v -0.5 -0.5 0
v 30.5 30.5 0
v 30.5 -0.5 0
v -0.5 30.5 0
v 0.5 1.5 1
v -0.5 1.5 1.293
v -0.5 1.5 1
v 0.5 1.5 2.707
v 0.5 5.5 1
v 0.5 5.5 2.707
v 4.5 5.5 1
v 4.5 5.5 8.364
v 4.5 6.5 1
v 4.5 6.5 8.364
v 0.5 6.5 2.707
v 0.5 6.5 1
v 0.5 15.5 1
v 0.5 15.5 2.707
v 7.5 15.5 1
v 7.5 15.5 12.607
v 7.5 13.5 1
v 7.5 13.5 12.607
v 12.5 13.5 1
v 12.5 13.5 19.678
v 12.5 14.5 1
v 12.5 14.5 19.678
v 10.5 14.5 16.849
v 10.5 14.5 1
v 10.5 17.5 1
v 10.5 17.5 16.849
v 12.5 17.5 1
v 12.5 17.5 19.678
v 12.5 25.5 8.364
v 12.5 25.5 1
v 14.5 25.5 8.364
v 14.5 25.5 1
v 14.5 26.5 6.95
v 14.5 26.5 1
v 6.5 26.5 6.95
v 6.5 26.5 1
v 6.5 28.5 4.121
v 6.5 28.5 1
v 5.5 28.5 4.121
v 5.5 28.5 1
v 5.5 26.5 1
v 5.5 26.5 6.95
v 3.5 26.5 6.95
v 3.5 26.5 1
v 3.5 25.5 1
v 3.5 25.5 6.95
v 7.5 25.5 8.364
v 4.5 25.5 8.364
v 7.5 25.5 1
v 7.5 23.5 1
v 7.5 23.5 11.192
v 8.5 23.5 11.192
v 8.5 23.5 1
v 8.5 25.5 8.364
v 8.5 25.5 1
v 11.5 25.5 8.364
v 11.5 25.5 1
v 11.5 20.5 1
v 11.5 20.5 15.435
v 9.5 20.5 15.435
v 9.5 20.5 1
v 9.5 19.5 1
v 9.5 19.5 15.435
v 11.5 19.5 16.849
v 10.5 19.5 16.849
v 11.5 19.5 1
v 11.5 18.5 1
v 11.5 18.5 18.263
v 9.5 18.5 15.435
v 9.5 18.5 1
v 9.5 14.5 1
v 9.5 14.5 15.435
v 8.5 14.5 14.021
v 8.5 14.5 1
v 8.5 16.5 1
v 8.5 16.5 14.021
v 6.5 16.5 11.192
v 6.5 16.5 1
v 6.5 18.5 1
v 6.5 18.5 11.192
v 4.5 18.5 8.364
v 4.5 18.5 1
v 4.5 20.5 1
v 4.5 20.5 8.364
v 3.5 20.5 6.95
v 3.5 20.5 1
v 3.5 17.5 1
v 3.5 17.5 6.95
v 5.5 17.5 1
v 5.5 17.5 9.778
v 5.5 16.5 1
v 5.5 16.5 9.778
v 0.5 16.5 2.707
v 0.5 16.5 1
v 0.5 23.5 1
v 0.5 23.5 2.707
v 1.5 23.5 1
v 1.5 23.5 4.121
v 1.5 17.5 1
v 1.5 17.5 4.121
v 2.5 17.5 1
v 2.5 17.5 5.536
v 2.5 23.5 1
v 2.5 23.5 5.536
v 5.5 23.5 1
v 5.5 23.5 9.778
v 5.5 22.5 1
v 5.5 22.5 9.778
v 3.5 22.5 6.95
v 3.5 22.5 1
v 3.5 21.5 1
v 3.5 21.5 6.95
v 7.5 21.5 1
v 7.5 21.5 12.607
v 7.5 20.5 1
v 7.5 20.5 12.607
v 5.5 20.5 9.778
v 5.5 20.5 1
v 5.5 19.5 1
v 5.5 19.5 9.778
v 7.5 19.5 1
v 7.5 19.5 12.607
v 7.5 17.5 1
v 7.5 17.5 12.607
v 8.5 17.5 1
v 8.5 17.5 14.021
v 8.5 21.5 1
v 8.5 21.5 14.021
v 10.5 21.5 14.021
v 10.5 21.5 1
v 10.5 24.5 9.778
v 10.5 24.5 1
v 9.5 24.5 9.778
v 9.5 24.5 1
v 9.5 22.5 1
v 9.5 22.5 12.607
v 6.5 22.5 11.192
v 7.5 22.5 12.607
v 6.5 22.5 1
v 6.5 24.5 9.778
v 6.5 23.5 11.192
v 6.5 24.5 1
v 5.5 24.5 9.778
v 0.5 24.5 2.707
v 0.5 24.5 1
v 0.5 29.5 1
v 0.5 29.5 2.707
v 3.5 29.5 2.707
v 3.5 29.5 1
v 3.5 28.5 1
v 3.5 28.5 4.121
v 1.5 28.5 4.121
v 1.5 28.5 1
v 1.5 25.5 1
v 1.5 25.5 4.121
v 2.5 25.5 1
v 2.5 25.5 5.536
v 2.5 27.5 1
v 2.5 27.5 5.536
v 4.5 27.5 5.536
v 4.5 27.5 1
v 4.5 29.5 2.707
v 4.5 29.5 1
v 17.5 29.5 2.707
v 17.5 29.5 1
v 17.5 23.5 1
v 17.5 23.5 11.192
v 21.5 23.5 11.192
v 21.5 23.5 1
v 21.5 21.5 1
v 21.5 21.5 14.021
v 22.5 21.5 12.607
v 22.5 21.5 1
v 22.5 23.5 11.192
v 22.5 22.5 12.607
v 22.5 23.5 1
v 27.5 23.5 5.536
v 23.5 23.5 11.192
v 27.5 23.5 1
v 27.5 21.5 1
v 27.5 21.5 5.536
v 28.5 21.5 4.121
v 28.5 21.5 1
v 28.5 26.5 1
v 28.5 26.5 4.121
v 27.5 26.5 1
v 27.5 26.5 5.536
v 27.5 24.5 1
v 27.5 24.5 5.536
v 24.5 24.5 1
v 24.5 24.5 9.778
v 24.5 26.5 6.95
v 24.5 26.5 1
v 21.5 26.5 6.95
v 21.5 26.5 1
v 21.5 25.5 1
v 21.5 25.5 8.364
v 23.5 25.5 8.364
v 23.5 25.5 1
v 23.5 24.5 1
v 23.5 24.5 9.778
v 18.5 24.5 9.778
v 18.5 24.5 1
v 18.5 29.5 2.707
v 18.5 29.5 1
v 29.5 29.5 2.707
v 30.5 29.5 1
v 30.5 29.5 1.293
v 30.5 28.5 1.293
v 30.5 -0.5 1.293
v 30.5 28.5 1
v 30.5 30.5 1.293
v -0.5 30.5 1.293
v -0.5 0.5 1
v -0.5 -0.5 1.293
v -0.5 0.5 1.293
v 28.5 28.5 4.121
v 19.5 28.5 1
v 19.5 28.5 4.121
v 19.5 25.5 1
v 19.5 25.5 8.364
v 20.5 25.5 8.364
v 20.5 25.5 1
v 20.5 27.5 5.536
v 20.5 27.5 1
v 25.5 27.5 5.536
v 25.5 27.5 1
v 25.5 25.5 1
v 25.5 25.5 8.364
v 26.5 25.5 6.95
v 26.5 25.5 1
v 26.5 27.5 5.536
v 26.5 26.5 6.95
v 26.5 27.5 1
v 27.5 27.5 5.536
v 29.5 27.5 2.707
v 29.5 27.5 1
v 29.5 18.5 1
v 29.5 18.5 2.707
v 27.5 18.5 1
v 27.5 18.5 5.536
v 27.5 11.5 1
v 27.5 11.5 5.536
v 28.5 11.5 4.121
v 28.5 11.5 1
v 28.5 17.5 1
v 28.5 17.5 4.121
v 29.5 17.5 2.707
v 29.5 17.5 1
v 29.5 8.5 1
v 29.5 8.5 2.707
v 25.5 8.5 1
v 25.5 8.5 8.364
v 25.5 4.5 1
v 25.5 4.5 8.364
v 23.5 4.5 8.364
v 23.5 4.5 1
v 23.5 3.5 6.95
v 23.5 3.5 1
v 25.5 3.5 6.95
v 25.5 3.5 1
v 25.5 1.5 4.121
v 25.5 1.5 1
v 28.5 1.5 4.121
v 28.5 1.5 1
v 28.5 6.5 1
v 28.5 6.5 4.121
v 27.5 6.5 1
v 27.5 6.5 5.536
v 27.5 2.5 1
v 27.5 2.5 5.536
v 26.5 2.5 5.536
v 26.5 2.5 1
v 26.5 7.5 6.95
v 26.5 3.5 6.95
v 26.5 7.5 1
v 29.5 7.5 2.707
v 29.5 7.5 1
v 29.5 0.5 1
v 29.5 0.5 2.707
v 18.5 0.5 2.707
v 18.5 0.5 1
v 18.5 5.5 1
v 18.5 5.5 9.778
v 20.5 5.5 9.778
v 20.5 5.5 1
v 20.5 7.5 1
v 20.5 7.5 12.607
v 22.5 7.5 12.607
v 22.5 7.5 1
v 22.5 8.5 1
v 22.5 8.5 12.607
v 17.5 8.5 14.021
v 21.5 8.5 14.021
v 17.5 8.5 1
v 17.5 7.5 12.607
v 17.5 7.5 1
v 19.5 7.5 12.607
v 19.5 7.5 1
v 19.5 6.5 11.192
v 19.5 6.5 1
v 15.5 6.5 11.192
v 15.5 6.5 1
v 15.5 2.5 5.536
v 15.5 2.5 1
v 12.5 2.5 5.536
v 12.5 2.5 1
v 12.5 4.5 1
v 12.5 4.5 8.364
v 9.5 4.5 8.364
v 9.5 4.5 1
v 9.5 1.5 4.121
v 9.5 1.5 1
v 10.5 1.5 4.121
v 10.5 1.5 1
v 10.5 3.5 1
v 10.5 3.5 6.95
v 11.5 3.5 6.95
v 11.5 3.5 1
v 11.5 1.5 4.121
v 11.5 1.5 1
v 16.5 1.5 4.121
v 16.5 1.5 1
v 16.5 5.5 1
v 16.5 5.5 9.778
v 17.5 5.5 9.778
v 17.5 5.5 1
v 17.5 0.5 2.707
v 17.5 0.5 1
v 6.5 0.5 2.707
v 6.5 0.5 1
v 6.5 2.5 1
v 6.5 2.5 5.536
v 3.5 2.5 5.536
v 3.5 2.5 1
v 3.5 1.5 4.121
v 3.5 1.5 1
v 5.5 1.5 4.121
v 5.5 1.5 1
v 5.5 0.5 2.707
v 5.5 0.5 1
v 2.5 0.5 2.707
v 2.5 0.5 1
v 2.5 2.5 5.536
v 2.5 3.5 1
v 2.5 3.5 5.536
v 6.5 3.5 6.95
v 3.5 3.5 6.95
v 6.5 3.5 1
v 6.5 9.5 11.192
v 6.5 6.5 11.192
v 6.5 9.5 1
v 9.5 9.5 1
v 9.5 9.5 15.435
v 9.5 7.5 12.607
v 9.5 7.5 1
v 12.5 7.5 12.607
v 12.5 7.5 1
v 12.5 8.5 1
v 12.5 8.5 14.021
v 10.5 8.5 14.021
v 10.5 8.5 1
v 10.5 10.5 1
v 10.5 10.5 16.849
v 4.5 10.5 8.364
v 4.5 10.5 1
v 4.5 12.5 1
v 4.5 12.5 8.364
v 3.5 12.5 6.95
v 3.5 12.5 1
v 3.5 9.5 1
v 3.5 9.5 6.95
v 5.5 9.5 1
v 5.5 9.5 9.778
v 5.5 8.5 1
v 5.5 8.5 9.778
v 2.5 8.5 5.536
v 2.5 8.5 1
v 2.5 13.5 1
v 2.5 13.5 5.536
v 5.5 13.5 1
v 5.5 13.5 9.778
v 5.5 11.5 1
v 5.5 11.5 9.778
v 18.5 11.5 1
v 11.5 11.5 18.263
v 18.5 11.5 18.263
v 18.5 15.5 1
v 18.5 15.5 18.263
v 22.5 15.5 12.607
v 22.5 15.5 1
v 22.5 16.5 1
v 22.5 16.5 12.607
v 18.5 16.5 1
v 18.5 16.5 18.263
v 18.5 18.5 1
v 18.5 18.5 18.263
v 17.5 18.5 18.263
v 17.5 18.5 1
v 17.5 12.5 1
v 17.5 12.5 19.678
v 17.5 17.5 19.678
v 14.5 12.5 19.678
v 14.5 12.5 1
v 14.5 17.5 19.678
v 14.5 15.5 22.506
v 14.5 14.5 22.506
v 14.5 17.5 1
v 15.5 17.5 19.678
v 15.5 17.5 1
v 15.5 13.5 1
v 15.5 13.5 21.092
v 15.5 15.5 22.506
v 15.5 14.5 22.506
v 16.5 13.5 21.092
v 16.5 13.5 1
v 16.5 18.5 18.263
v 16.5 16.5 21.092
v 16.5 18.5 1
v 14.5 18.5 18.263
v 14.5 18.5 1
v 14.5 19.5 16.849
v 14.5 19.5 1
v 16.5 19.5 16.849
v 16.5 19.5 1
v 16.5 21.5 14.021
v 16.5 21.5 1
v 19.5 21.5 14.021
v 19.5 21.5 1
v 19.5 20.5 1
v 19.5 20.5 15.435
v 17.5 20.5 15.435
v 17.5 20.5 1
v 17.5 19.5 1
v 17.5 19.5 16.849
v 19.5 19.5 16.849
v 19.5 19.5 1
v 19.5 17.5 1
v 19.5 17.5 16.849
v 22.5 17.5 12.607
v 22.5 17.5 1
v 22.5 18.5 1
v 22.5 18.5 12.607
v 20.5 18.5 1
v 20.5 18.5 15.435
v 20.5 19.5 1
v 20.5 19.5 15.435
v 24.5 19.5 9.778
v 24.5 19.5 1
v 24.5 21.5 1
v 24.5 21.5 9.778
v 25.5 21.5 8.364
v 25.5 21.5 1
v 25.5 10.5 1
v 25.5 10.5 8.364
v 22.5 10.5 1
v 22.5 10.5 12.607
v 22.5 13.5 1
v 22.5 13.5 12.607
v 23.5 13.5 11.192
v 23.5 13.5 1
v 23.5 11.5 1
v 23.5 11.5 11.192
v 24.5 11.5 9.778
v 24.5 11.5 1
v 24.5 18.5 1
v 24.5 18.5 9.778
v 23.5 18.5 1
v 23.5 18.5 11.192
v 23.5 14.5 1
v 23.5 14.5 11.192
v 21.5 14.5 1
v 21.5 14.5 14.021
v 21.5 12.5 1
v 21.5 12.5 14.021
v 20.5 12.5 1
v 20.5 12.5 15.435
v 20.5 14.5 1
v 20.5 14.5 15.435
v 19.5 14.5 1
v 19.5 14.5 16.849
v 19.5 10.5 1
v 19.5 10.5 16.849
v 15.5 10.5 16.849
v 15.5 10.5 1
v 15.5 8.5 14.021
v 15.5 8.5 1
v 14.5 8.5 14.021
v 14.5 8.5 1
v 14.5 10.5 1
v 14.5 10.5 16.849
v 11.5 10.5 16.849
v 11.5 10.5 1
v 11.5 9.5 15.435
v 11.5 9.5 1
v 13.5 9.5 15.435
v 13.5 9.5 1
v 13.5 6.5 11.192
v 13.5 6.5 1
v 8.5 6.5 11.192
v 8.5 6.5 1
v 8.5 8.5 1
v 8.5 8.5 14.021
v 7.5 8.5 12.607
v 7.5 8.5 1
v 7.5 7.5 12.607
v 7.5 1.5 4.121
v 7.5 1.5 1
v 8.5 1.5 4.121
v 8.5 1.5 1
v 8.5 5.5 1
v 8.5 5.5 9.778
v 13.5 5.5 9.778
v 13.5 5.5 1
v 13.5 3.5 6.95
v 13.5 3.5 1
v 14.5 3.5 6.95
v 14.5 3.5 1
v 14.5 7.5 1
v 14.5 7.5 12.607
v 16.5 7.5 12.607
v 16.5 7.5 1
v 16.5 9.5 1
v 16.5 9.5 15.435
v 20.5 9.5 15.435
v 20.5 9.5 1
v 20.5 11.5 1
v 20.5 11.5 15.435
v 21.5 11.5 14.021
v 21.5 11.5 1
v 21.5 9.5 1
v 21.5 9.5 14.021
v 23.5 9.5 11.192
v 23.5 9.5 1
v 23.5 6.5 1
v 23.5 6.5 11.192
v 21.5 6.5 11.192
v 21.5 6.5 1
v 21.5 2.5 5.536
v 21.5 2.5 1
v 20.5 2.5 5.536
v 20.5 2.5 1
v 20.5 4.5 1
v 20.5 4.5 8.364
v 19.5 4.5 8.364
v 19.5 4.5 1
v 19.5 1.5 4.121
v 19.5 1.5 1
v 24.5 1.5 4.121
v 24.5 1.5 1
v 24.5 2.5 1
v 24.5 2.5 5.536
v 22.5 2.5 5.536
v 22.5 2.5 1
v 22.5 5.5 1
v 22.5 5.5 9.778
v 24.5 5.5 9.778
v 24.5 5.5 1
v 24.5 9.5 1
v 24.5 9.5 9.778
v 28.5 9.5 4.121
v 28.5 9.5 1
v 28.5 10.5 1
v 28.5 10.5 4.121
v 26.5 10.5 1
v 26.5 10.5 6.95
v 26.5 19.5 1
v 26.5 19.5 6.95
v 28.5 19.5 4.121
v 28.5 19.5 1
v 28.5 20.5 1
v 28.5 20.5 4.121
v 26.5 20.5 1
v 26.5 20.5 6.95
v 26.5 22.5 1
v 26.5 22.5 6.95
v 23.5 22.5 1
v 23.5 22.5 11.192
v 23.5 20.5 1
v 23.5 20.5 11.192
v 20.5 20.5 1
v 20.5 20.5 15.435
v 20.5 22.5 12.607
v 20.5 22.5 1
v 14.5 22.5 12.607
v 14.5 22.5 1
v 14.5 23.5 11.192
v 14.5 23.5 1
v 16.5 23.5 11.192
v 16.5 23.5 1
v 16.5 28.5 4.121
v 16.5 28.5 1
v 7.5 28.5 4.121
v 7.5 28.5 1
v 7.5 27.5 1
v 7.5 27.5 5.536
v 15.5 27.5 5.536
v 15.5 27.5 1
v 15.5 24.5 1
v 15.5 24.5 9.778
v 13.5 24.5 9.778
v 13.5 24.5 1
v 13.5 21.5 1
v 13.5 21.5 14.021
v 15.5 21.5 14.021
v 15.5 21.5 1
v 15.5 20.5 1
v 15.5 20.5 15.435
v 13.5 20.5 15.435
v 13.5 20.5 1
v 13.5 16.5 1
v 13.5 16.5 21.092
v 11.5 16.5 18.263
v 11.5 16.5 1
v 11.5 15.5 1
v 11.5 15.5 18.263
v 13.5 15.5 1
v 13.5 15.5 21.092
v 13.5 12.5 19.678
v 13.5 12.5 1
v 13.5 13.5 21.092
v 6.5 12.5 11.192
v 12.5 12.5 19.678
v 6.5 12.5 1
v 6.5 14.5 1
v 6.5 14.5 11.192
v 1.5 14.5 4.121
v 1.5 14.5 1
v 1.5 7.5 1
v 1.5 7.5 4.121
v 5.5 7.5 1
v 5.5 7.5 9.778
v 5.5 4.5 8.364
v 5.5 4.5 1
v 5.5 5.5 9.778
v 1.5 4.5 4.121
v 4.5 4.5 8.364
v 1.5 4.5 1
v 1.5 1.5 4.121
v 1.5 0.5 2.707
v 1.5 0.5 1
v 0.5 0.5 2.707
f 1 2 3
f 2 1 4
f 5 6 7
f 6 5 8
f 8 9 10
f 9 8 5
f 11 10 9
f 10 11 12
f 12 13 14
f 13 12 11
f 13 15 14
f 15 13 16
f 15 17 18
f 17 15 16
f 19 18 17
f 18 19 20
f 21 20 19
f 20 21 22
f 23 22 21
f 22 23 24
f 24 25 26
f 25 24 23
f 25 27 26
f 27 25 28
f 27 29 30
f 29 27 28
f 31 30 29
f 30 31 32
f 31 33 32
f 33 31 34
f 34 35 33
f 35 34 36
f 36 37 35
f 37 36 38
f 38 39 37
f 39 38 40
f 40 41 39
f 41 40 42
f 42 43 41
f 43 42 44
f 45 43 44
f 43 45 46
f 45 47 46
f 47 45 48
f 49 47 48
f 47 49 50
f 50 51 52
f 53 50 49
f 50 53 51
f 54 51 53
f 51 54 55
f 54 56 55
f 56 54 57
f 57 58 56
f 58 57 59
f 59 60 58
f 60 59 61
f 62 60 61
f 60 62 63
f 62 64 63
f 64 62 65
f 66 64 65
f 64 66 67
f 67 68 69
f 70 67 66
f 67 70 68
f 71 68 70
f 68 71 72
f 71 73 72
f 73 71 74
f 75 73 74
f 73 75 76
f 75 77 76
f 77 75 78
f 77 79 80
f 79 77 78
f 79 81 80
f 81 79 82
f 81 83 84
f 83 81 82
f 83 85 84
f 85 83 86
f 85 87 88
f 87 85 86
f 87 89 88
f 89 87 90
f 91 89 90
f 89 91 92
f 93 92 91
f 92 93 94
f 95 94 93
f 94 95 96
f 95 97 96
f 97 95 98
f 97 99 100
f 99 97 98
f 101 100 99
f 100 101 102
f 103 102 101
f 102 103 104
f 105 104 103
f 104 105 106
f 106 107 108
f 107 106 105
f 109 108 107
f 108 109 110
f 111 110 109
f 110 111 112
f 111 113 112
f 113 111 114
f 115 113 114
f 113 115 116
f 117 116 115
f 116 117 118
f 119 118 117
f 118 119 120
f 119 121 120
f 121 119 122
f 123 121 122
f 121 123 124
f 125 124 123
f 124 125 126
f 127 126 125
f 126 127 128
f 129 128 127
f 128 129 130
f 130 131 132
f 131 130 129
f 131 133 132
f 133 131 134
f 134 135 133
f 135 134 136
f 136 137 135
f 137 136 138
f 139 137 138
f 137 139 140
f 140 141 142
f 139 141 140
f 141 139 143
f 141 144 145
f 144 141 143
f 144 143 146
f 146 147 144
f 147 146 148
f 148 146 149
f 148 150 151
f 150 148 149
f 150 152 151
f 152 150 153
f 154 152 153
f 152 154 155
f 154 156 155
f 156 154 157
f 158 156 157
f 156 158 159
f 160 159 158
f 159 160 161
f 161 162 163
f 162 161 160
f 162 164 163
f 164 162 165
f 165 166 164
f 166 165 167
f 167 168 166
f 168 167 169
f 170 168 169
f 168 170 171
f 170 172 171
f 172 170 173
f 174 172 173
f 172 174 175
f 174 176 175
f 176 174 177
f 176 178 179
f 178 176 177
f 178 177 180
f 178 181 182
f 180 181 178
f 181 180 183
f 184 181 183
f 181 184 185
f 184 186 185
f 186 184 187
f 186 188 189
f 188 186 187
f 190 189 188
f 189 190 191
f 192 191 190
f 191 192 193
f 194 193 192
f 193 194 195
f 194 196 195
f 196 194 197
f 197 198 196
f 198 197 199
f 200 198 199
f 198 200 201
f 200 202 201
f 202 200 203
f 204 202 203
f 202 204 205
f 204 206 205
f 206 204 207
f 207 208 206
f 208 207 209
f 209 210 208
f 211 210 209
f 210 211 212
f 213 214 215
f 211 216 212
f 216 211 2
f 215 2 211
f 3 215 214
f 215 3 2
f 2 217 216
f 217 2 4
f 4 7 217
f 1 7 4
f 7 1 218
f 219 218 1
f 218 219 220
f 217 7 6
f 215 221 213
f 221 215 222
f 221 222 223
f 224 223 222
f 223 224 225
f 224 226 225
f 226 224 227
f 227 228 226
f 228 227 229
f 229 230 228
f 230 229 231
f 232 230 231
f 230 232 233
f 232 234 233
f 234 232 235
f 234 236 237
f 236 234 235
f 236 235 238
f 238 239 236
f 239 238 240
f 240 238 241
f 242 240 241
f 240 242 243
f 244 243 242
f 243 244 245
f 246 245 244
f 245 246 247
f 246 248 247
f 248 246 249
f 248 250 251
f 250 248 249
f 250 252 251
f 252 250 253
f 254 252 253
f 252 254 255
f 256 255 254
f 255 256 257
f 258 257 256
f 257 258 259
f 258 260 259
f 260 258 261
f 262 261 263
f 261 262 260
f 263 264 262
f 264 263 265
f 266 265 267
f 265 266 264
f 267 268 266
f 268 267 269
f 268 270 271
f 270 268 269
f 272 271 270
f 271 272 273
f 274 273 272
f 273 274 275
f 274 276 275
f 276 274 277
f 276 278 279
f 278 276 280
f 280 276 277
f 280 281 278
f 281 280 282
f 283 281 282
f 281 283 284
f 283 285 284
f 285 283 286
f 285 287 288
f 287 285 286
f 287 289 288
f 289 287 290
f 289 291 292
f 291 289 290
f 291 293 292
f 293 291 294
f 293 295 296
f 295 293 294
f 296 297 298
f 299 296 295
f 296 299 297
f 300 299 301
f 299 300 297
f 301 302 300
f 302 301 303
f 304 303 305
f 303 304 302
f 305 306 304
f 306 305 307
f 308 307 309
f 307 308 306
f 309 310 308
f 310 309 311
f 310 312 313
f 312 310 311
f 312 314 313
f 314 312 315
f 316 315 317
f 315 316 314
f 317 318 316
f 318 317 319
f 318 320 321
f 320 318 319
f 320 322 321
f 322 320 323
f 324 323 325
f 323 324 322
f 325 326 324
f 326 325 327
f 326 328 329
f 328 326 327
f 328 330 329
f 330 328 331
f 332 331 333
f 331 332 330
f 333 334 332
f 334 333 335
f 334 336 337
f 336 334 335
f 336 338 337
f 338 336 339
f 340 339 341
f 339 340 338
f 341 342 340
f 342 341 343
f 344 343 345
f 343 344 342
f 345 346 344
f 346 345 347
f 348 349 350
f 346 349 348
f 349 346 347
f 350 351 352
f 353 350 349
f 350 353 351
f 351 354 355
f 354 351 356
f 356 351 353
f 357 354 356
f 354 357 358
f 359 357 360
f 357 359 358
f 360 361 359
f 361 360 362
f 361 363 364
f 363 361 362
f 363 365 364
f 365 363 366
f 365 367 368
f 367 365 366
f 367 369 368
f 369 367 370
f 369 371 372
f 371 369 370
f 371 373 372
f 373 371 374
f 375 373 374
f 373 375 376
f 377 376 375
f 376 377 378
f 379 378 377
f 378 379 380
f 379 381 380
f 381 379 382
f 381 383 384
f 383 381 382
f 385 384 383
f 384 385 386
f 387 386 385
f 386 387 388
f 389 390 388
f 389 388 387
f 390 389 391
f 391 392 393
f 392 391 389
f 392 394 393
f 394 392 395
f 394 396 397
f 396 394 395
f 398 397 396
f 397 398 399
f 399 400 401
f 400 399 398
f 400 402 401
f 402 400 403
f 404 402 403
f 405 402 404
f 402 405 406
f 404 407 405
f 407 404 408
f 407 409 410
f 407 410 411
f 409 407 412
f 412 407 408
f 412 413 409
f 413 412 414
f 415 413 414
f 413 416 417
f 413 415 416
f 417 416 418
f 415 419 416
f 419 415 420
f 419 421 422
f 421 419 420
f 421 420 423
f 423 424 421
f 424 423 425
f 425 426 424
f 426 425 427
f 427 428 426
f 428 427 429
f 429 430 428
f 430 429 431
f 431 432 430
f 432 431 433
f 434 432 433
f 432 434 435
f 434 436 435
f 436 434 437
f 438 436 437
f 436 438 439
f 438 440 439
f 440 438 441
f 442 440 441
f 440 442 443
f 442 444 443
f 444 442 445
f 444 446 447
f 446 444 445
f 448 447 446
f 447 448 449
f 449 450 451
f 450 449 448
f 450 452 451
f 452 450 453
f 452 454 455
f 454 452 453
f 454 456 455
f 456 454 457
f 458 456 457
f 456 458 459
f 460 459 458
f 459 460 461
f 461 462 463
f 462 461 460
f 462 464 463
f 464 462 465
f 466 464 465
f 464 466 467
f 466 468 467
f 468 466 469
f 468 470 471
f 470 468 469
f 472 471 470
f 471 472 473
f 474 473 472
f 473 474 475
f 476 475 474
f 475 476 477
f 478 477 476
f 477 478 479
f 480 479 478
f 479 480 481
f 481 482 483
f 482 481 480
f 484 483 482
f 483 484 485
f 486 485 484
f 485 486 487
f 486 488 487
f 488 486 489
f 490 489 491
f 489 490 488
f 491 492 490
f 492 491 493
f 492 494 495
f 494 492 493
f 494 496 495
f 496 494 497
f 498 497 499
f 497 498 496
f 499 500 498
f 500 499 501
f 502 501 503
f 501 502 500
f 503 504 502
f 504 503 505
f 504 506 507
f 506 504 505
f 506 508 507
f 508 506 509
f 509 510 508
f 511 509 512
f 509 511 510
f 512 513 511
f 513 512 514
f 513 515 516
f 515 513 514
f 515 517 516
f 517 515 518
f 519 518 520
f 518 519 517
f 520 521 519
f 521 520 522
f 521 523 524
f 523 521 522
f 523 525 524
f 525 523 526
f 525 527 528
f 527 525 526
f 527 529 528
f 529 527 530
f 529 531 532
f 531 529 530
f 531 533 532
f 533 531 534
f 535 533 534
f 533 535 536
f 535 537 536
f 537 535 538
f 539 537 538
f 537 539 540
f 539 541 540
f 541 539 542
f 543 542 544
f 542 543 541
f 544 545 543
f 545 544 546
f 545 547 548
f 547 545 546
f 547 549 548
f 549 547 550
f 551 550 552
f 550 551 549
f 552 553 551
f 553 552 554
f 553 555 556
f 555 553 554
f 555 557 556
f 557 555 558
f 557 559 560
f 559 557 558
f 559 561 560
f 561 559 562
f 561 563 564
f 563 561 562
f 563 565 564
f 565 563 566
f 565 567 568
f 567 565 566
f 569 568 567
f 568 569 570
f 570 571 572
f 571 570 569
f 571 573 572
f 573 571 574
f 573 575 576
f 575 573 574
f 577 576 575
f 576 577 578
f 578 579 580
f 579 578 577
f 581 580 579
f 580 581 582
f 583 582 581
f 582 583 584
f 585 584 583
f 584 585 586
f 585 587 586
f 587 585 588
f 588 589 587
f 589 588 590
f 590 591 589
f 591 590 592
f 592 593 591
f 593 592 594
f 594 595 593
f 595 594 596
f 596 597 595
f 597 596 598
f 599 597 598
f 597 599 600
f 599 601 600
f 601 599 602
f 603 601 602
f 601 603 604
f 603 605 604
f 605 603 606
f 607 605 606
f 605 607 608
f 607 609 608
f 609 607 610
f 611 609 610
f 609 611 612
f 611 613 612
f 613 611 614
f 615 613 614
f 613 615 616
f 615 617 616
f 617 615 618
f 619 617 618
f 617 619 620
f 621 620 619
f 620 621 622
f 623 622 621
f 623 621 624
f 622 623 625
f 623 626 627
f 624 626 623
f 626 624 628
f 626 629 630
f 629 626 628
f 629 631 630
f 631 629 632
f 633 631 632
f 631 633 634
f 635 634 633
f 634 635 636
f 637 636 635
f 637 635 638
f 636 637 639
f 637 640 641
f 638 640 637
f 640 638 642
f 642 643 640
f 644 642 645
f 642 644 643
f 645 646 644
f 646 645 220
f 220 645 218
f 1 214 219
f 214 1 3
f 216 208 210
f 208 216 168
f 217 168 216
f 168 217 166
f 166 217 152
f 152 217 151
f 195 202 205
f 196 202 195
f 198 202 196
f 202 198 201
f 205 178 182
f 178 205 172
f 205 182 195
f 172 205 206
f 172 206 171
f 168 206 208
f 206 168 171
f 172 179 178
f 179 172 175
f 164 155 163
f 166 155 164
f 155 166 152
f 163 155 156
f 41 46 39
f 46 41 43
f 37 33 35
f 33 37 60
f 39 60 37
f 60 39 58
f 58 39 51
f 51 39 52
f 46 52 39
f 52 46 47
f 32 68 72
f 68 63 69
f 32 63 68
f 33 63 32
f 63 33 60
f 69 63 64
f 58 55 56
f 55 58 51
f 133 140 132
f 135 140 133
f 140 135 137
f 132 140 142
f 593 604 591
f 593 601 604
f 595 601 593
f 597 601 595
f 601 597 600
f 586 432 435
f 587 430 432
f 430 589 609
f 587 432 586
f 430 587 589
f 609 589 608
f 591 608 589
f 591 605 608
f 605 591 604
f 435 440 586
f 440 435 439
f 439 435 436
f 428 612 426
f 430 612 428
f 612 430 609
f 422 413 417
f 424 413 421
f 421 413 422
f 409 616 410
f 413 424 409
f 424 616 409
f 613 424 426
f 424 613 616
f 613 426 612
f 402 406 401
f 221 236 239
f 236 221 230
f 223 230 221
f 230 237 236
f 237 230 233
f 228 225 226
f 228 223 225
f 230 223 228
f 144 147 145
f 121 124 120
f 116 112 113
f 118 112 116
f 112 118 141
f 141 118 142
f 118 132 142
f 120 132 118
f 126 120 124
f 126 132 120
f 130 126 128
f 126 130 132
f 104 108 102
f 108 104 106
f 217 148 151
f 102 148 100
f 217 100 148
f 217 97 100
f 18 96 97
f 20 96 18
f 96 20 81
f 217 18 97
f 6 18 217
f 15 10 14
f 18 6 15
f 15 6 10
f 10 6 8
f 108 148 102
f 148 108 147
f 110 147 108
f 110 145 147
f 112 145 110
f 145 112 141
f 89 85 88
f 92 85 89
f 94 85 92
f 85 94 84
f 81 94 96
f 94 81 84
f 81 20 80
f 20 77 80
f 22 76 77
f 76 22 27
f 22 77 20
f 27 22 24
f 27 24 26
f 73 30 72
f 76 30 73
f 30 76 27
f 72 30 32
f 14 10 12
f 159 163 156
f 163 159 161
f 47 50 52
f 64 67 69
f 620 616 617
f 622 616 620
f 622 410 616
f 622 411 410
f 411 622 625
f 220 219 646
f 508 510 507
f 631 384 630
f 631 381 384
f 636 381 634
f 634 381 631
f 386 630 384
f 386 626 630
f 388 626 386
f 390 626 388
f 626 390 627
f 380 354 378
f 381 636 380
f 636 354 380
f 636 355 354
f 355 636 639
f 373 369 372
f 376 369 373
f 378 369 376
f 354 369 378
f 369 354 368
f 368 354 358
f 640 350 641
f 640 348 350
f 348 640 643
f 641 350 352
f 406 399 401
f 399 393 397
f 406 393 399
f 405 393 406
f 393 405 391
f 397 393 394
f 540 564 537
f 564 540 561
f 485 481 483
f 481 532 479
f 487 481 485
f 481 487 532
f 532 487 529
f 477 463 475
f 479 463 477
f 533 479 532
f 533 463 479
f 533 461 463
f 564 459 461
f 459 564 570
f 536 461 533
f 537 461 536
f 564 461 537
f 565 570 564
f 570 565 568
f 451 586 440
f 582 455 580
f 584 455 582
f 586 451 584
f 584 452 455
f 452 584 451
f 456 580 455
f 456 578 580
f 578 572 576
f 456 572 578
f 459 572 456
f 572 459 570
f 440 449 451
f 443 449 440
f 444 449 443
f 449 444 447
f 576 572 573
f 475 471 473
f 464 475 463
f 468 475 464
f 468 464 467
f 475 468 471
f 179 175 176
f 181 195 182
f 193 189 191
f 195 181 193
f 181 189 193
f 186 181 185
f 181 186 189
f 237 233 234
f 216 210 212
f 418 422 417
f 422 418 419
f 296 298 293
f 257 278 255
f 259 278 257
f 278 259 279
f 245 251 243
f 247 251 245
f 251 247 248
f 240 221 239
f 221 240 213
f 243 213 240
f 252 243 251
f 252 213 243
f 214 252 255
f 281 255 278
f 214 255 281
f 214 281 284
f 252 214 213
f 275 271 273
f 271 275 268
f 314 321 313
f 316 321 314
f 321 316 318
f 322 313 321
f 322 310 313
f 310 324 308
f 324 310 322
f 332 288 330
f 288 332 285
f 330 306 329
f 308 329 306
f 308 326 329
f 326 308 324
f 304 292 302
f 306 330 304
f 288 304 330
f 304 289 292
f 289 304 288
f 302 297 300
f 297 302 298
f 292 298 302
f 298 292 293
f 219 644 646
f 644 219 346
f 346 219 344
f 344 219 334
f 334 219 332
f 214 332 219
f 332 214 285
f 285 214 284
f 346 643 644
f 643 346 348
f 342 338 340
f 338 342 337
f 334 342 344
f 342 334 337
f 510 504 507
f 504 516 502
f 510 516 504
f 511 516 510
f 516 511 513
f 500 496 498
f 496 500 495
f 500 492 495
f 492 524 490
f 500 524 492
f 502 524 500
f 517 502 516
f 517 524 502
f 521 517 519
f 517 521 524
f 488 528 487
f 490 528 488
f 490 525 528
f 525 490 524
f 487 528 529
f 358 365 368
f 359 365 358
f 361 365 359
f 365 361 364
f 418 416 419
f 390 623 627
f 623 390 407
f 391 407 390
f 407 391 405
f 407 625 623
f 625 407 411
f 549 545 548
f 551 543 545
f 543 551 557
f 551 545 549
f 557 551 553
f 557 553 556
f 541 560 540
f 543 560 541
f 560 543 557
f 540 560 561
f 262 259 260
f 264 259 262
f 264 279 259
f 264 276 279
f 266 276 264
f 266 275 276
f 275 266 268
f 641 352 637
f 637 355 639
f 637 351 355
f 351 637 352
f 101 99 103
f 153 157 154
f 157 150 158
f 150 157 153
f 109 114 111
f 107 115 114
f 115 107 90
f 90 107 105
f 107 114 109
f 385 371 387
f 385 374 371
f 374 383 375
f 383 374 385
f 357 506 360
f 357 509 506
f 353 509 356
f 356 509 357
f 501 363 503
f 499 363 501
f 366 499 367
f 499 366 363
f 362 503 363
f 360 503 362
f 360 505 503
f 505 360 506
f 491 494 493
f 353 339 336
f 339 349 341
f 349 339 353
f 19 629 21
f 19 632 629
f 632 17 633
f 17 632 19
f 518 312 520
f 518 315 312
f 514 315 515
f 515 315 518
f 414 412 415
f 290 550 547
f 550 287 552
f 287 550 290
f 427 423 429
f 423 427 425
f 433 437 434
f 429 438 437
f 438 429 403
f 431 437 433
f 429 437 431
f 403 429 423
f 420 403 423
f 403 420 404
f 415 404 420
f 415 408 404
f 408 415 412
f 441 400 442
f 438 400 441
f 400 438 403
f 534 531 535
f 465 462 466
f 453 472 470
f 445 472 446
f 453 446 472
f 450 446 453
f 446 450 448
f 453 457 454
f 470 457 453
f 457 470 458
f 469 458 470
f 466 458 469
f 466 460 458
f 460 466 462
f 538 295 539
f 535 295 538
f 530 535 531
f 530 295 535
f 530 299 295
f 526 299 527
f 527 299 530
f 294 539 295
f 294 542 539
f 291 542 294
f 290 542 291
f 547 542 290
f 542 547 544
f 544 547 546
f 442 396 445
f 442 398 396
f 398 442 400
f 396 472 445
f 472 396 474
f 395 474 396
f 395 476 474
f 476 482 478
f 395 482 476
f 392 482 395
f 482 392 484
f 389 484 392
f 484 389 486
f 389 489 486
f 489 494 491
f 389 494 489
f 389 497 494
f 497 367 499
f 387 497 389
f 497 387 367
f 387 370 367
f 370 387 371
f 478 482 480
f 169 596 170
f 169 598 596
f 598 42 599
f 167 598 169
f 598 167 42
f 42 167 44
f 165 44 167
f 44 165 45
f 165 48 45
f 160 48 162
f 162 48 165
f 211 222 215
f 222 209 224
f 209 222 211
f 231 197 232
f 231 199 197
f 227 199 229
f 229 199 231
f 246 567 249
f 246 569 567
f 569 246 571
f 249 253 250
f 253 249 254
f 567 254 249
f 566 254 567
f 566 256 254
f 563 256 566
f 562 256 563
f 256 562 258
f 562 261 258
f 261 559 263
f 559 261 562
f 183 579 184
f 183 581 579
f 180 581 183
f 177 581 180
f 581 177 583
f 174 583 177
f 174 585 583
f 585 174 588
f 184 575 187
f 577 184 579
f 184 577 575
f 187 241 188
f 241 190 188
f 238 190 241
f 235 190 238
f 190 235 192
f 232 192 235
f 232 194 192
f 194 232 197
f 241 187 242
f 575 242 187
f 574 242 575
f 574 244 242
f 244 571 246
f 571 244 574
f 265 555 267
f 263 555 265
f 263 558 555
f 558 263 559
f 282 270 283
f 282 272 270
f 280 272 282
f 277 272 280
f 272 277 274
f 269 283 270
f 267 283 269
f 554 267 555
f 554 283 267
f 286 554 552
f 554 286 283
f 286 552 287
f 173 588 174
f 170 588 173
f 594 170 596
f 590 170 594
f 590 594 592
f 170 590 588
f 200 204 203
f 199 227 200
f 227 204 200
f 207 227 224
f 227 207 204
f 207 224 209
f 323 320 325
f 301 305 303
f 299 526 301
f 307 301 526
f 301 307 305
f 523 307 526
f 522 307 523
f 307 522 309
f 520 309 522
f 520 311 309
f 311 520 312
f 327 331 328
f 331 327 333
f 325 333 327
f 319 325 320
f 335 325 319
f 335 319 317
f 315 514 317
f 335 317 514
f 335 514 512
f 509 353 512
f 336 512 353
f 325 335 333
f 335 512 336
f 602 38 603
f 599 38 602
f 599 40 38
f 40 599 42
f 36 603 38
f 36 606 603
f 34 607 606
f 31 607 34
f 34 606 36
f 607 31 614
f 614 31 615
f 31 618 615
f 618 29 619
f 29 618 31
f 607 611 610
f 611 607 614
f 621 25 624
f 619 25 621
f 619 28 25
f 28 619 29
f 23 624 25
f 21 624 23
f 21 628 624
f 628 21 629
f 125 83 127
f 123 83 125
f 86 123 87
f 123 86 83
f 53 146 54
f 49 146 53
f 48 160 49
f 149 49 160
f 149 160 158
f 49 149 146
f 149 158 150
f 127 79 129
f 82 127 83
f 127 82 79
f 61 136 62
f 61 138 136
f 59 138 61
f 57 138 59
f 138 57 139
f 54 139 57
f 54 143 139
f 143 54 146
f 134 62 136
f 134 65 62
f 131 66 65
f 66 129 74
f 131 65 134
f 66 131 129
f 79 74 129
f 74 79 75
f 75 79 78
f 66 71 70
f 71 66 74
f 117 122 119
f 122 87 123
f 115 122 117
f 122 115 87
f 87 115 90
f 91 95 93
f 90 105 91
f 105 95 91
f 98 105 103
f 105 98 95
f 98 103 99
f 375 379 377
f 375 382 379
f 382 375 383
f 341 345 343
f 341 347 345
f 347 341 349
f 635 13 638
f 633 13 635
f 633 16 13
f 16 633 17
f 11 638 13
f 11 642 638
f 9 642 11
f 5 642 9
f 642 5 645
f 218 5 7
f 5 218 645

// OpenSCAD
square_block = 15; 
wall_thickness = 1;
block_width = 2;

/*
 * constants, for clearness
 *
 */
 
// random directions, for picking up a direction to visit the next block
function PERMUTATION_OF_FOUR() = [
    [1, 2, 3, 4],
    [1, 2, 4, 3],
    [1, 3, 2, 4],
    [1, 3, 4, 2],
    [1, 4, 2, 3],
    [1, 4, 3, 2],
    [2, 1, 3, 4],
    [2, 1, 4, 3],
    [2, 3, 1, 4],
    [2, 3, 4, 1],
    [2, 4, 1, 3],
    [2, 4, 3, 1],
    [3, 1, 2, 4],
    [3, 1, 4, 2],
    [3, 2, 1, 4],
    [3, 2, 4, 1],
    [3, 4, 1, 2],
    [3, 4, 2, 1],
    [4, 1, 2, 3],
    [4, 1, 3, 2],
    [4, 2, 1, 3],
    [4, 2, 3, 1],
    [4, 3, 1, 2],
    [4, 3, 2, 1]
];

function NO_WALL() = 0;
function UP_WALL() = 1;
function RIGHT_WALL() = 2;
function UP_RIGHT_WALL() = 3;

function NOT_VISITED() = 0;
function VISITED() = 1;

/* 
 * modules for creating a maze
 *
 */

// give a [x, y] point and length. draw a line in the x direction
module x_line(point, length, thickness = 1) {
    offset = thickness / 2;
    translate([point[0] - offset, point[1] - offset, 0]) 
        square([length + thickness, thickness]);
}

// give a [x, y] point and length. draw a line in the y direction
module y_line(point, length, thickness = 1) {
    offset = thickness / 2;
    translate([point[0] - offset, point[1] - offset, 0])  
        square([thickness, length + thickness]);
}

// create the outer wall of maze
module maze_outer_wall(rows, columns, block_width = 5, wall_thickness = 1) {
    x_line([0, rows * block_width], columns * block_width, wall_thickness);
    y_line([0, block_width], (rows - 1) * block_width, wall_thickness);
}

// create the inner wall of maze
module maze_inner_wall(maze, block_width = 5, wall_thickness = 1) {
    for(i = [0:len(maze) - 1]) {
        cord = maze[i];
        x = (cord[0] - 1) * block_width;
        y = (cord[1] - 1) * block_width;
        v = cord[3];
        
        if(v == 1 || v == 3) {
            x_line([x, y], block_width, wall_thickness);
        }
        if(v == 2 || v == 3) {
            y_line([x + block_width, y], block_width, wall_thickness);
        }
    }  
}

// create a maze
module maze(rows, columns, maze_vector, block_width = 5, wall_thickness = 1) {
     maze_outer_wall(rows, columns, block_width, wall_thickness);
     maze_inner_wall(maze_vector, block_width, wall_thickness);
}

/* 
 * utilities functions
 *
 */

// comare the equality of [x1, y1] and [x2, y2]
function cord_equals(cord1, cord2) = cord1 == cord2;

// is the point visited?
function not_visited(cord, vs, index = 0) =
    index == len(vs) ? true : 
        (cord_equals([vs[index][0], vs[index][1]], cord) && vs[index][2] == 1 ? false :
            not_visited(cord, vs, index + 1));
            
// pick a direction randomly
function rand_dirs() =
    PERMUTATION_OF_FOUR()[round(rands(0, 24, 1)[0])]; 

// replace v1 in the vector with v2 
function replace(v1, v2, vs) =
    [for(i = [0:len(vs) - 1]) vs[i] == v1 ? v2 : vs[i]];
    
/* 
 * functions for generating a maze vector
 *
 */

// initialize a maze
function init_maze(rows, columns) = 
    [
	    for(c = [1 : columns]) 
	        for(r = [1 : rows]) 
		        [c, r, 0,  UP_RIGHT_WALL()]
	];
    
// find a vector in the maze vector
function find(i, j, maze_vector, index = 0) =
    index == len(maze_vector) ? [] : (
        cord_equals([i, j], [maze_vector[index][0], maze_vector[index][1]]) ? maze_vector[index] : find(i, j, maze_vector, index + 1)
    );

////
// NO_WALL = 0;
// UP_WALL = 1;
// RIGHT_WALL = 2;
// UP_RIGHT_WALL = 3;
function delete_right_wall(original_block) = 
    original_block == NO_WALL() || original_block == RIGHT_WALL() ? NO_WALL() : UP_WALL();

function delete_up_wall(original_block) = 
    (original_block == NO_WALL() || original_block == UP_WALL()) ? NO_WALL() : RIGHT_WALL();
    
function delete_right_wall_of(vs, is_visited, maze_vector) =
    replace(vs, [vs[0], vs[1] , is_visited, delete_right_wall(vs[3])] ,maze_vector);

function delete_up_wall_of(vs, is_visited, maze_vector) =
    replace(vs, [vs[0], vs[1] , is_visited, delete_up_wall(vs[3])] ,maze_vector);

function go_right(i, j, rows, columns, maze_vector) =
    go_maze(i + 1, j, rows, columns, delete_right_wall_of(find(i, j, maze_vector), VISITED(), maze_vector));
    
function go_up(i, j, rows, columns, maze_vector) =
    go_maze(i, j - 1, rows, columns, delete_up_wall_of(find(i, j, maze_vector), VISITED(), maze_vector));
    
function visit(v, maze_vector) =
    replace(v, [v[0], v[1], VISITED(), v[3]], maze_vector);
 
function go_left(i, j, rows, columns, maze_vector) =
    go_maze(i - 1, j, rows, columns, delete_right_wall_of(find(i - 1, j, maze_vector), NOT_VISITED(), maze_vector));
    
function go_down(i, j, rows, columns, maze_vector) =
    go_maze(i, j + 1, rows, columns, delete_up_wall_of(find(i, j + 1, maze_vector), NOT_VISITED(), maze_vector));
    
function go_maze(i, j, rows, columns, maze_vector) =
    look_around(i, j, rand_dirs(), rows, columns, visit(find(i, j, maze_vector), maze_vector));
    
function look_around(i, j, dirs, rows, columns, maze_vector, index = 0) =
    index == 4 ? maze_vector : 
        look_around( 
            i, j, dirs, 
            rows, columns, 
            build_wall(i, j, dirs[index], rows, columns, maze_vector), 
            index + 1
        ); 

function build_wall(i, j, n, rows, columns, maze_vector) = 
    n == 1 && i != columns && not_visited([i + 1, j], maze_vector) ? go_right(i, j, rows, columns, maze_vector) : ( 
        n == 2 && j != 1 && not_visited([i, j - 1], maze_vector) ? go_up(i, j, rows, columns, maze_vector)  : (
            n == 3 && i != 1 && not_visited([i - 1, j], maze_vector) ? go_left(i, j,rows, columns,  maze_vector)  : (
                n == 4 && j != rows && not_visited([i, j + 1], maze_vector) ? go_down(i, j, rows, columns, maze_vector) : maze_vector
            ) 
        )
    ); 

module maze_pyramid(square_block, block_width = 2, wall_thickness = 1) {

	maze_vector = go_maze(1, 1, square_block, square_block, replace([square_block, square_block, 0, UP_RIGHT_WALL()], [square_block, square_block, 0, UP_WALL()], init_maze(square_block, square_block)));

	diameter = square_block * block_width / 1.4142135623730950488016887242097 + wall_thickness * 2;
	half_wall_thickness = wall_thickness / 2;
	offset = square_block * block_width / 2;
	
	intersection() {
		linear_extrude(diameter) 
			maze(square_block, square_block, maze_vector, block_width, wall_thickness);

		translate([offset, offset, 0])     
			rotate([0, 0, 45]) 
				cylinder(diameter, diameter, 0, $fn=4);
	}

	translate([-half_wall_thickness, -half_wall_thickness, 0])     
	    linear_extrude(wall_thickness) 
		    square(square_block * block_width + wall_thickness);

}
	
maze_pyramid(square_block, block_width, wall_thickness);
